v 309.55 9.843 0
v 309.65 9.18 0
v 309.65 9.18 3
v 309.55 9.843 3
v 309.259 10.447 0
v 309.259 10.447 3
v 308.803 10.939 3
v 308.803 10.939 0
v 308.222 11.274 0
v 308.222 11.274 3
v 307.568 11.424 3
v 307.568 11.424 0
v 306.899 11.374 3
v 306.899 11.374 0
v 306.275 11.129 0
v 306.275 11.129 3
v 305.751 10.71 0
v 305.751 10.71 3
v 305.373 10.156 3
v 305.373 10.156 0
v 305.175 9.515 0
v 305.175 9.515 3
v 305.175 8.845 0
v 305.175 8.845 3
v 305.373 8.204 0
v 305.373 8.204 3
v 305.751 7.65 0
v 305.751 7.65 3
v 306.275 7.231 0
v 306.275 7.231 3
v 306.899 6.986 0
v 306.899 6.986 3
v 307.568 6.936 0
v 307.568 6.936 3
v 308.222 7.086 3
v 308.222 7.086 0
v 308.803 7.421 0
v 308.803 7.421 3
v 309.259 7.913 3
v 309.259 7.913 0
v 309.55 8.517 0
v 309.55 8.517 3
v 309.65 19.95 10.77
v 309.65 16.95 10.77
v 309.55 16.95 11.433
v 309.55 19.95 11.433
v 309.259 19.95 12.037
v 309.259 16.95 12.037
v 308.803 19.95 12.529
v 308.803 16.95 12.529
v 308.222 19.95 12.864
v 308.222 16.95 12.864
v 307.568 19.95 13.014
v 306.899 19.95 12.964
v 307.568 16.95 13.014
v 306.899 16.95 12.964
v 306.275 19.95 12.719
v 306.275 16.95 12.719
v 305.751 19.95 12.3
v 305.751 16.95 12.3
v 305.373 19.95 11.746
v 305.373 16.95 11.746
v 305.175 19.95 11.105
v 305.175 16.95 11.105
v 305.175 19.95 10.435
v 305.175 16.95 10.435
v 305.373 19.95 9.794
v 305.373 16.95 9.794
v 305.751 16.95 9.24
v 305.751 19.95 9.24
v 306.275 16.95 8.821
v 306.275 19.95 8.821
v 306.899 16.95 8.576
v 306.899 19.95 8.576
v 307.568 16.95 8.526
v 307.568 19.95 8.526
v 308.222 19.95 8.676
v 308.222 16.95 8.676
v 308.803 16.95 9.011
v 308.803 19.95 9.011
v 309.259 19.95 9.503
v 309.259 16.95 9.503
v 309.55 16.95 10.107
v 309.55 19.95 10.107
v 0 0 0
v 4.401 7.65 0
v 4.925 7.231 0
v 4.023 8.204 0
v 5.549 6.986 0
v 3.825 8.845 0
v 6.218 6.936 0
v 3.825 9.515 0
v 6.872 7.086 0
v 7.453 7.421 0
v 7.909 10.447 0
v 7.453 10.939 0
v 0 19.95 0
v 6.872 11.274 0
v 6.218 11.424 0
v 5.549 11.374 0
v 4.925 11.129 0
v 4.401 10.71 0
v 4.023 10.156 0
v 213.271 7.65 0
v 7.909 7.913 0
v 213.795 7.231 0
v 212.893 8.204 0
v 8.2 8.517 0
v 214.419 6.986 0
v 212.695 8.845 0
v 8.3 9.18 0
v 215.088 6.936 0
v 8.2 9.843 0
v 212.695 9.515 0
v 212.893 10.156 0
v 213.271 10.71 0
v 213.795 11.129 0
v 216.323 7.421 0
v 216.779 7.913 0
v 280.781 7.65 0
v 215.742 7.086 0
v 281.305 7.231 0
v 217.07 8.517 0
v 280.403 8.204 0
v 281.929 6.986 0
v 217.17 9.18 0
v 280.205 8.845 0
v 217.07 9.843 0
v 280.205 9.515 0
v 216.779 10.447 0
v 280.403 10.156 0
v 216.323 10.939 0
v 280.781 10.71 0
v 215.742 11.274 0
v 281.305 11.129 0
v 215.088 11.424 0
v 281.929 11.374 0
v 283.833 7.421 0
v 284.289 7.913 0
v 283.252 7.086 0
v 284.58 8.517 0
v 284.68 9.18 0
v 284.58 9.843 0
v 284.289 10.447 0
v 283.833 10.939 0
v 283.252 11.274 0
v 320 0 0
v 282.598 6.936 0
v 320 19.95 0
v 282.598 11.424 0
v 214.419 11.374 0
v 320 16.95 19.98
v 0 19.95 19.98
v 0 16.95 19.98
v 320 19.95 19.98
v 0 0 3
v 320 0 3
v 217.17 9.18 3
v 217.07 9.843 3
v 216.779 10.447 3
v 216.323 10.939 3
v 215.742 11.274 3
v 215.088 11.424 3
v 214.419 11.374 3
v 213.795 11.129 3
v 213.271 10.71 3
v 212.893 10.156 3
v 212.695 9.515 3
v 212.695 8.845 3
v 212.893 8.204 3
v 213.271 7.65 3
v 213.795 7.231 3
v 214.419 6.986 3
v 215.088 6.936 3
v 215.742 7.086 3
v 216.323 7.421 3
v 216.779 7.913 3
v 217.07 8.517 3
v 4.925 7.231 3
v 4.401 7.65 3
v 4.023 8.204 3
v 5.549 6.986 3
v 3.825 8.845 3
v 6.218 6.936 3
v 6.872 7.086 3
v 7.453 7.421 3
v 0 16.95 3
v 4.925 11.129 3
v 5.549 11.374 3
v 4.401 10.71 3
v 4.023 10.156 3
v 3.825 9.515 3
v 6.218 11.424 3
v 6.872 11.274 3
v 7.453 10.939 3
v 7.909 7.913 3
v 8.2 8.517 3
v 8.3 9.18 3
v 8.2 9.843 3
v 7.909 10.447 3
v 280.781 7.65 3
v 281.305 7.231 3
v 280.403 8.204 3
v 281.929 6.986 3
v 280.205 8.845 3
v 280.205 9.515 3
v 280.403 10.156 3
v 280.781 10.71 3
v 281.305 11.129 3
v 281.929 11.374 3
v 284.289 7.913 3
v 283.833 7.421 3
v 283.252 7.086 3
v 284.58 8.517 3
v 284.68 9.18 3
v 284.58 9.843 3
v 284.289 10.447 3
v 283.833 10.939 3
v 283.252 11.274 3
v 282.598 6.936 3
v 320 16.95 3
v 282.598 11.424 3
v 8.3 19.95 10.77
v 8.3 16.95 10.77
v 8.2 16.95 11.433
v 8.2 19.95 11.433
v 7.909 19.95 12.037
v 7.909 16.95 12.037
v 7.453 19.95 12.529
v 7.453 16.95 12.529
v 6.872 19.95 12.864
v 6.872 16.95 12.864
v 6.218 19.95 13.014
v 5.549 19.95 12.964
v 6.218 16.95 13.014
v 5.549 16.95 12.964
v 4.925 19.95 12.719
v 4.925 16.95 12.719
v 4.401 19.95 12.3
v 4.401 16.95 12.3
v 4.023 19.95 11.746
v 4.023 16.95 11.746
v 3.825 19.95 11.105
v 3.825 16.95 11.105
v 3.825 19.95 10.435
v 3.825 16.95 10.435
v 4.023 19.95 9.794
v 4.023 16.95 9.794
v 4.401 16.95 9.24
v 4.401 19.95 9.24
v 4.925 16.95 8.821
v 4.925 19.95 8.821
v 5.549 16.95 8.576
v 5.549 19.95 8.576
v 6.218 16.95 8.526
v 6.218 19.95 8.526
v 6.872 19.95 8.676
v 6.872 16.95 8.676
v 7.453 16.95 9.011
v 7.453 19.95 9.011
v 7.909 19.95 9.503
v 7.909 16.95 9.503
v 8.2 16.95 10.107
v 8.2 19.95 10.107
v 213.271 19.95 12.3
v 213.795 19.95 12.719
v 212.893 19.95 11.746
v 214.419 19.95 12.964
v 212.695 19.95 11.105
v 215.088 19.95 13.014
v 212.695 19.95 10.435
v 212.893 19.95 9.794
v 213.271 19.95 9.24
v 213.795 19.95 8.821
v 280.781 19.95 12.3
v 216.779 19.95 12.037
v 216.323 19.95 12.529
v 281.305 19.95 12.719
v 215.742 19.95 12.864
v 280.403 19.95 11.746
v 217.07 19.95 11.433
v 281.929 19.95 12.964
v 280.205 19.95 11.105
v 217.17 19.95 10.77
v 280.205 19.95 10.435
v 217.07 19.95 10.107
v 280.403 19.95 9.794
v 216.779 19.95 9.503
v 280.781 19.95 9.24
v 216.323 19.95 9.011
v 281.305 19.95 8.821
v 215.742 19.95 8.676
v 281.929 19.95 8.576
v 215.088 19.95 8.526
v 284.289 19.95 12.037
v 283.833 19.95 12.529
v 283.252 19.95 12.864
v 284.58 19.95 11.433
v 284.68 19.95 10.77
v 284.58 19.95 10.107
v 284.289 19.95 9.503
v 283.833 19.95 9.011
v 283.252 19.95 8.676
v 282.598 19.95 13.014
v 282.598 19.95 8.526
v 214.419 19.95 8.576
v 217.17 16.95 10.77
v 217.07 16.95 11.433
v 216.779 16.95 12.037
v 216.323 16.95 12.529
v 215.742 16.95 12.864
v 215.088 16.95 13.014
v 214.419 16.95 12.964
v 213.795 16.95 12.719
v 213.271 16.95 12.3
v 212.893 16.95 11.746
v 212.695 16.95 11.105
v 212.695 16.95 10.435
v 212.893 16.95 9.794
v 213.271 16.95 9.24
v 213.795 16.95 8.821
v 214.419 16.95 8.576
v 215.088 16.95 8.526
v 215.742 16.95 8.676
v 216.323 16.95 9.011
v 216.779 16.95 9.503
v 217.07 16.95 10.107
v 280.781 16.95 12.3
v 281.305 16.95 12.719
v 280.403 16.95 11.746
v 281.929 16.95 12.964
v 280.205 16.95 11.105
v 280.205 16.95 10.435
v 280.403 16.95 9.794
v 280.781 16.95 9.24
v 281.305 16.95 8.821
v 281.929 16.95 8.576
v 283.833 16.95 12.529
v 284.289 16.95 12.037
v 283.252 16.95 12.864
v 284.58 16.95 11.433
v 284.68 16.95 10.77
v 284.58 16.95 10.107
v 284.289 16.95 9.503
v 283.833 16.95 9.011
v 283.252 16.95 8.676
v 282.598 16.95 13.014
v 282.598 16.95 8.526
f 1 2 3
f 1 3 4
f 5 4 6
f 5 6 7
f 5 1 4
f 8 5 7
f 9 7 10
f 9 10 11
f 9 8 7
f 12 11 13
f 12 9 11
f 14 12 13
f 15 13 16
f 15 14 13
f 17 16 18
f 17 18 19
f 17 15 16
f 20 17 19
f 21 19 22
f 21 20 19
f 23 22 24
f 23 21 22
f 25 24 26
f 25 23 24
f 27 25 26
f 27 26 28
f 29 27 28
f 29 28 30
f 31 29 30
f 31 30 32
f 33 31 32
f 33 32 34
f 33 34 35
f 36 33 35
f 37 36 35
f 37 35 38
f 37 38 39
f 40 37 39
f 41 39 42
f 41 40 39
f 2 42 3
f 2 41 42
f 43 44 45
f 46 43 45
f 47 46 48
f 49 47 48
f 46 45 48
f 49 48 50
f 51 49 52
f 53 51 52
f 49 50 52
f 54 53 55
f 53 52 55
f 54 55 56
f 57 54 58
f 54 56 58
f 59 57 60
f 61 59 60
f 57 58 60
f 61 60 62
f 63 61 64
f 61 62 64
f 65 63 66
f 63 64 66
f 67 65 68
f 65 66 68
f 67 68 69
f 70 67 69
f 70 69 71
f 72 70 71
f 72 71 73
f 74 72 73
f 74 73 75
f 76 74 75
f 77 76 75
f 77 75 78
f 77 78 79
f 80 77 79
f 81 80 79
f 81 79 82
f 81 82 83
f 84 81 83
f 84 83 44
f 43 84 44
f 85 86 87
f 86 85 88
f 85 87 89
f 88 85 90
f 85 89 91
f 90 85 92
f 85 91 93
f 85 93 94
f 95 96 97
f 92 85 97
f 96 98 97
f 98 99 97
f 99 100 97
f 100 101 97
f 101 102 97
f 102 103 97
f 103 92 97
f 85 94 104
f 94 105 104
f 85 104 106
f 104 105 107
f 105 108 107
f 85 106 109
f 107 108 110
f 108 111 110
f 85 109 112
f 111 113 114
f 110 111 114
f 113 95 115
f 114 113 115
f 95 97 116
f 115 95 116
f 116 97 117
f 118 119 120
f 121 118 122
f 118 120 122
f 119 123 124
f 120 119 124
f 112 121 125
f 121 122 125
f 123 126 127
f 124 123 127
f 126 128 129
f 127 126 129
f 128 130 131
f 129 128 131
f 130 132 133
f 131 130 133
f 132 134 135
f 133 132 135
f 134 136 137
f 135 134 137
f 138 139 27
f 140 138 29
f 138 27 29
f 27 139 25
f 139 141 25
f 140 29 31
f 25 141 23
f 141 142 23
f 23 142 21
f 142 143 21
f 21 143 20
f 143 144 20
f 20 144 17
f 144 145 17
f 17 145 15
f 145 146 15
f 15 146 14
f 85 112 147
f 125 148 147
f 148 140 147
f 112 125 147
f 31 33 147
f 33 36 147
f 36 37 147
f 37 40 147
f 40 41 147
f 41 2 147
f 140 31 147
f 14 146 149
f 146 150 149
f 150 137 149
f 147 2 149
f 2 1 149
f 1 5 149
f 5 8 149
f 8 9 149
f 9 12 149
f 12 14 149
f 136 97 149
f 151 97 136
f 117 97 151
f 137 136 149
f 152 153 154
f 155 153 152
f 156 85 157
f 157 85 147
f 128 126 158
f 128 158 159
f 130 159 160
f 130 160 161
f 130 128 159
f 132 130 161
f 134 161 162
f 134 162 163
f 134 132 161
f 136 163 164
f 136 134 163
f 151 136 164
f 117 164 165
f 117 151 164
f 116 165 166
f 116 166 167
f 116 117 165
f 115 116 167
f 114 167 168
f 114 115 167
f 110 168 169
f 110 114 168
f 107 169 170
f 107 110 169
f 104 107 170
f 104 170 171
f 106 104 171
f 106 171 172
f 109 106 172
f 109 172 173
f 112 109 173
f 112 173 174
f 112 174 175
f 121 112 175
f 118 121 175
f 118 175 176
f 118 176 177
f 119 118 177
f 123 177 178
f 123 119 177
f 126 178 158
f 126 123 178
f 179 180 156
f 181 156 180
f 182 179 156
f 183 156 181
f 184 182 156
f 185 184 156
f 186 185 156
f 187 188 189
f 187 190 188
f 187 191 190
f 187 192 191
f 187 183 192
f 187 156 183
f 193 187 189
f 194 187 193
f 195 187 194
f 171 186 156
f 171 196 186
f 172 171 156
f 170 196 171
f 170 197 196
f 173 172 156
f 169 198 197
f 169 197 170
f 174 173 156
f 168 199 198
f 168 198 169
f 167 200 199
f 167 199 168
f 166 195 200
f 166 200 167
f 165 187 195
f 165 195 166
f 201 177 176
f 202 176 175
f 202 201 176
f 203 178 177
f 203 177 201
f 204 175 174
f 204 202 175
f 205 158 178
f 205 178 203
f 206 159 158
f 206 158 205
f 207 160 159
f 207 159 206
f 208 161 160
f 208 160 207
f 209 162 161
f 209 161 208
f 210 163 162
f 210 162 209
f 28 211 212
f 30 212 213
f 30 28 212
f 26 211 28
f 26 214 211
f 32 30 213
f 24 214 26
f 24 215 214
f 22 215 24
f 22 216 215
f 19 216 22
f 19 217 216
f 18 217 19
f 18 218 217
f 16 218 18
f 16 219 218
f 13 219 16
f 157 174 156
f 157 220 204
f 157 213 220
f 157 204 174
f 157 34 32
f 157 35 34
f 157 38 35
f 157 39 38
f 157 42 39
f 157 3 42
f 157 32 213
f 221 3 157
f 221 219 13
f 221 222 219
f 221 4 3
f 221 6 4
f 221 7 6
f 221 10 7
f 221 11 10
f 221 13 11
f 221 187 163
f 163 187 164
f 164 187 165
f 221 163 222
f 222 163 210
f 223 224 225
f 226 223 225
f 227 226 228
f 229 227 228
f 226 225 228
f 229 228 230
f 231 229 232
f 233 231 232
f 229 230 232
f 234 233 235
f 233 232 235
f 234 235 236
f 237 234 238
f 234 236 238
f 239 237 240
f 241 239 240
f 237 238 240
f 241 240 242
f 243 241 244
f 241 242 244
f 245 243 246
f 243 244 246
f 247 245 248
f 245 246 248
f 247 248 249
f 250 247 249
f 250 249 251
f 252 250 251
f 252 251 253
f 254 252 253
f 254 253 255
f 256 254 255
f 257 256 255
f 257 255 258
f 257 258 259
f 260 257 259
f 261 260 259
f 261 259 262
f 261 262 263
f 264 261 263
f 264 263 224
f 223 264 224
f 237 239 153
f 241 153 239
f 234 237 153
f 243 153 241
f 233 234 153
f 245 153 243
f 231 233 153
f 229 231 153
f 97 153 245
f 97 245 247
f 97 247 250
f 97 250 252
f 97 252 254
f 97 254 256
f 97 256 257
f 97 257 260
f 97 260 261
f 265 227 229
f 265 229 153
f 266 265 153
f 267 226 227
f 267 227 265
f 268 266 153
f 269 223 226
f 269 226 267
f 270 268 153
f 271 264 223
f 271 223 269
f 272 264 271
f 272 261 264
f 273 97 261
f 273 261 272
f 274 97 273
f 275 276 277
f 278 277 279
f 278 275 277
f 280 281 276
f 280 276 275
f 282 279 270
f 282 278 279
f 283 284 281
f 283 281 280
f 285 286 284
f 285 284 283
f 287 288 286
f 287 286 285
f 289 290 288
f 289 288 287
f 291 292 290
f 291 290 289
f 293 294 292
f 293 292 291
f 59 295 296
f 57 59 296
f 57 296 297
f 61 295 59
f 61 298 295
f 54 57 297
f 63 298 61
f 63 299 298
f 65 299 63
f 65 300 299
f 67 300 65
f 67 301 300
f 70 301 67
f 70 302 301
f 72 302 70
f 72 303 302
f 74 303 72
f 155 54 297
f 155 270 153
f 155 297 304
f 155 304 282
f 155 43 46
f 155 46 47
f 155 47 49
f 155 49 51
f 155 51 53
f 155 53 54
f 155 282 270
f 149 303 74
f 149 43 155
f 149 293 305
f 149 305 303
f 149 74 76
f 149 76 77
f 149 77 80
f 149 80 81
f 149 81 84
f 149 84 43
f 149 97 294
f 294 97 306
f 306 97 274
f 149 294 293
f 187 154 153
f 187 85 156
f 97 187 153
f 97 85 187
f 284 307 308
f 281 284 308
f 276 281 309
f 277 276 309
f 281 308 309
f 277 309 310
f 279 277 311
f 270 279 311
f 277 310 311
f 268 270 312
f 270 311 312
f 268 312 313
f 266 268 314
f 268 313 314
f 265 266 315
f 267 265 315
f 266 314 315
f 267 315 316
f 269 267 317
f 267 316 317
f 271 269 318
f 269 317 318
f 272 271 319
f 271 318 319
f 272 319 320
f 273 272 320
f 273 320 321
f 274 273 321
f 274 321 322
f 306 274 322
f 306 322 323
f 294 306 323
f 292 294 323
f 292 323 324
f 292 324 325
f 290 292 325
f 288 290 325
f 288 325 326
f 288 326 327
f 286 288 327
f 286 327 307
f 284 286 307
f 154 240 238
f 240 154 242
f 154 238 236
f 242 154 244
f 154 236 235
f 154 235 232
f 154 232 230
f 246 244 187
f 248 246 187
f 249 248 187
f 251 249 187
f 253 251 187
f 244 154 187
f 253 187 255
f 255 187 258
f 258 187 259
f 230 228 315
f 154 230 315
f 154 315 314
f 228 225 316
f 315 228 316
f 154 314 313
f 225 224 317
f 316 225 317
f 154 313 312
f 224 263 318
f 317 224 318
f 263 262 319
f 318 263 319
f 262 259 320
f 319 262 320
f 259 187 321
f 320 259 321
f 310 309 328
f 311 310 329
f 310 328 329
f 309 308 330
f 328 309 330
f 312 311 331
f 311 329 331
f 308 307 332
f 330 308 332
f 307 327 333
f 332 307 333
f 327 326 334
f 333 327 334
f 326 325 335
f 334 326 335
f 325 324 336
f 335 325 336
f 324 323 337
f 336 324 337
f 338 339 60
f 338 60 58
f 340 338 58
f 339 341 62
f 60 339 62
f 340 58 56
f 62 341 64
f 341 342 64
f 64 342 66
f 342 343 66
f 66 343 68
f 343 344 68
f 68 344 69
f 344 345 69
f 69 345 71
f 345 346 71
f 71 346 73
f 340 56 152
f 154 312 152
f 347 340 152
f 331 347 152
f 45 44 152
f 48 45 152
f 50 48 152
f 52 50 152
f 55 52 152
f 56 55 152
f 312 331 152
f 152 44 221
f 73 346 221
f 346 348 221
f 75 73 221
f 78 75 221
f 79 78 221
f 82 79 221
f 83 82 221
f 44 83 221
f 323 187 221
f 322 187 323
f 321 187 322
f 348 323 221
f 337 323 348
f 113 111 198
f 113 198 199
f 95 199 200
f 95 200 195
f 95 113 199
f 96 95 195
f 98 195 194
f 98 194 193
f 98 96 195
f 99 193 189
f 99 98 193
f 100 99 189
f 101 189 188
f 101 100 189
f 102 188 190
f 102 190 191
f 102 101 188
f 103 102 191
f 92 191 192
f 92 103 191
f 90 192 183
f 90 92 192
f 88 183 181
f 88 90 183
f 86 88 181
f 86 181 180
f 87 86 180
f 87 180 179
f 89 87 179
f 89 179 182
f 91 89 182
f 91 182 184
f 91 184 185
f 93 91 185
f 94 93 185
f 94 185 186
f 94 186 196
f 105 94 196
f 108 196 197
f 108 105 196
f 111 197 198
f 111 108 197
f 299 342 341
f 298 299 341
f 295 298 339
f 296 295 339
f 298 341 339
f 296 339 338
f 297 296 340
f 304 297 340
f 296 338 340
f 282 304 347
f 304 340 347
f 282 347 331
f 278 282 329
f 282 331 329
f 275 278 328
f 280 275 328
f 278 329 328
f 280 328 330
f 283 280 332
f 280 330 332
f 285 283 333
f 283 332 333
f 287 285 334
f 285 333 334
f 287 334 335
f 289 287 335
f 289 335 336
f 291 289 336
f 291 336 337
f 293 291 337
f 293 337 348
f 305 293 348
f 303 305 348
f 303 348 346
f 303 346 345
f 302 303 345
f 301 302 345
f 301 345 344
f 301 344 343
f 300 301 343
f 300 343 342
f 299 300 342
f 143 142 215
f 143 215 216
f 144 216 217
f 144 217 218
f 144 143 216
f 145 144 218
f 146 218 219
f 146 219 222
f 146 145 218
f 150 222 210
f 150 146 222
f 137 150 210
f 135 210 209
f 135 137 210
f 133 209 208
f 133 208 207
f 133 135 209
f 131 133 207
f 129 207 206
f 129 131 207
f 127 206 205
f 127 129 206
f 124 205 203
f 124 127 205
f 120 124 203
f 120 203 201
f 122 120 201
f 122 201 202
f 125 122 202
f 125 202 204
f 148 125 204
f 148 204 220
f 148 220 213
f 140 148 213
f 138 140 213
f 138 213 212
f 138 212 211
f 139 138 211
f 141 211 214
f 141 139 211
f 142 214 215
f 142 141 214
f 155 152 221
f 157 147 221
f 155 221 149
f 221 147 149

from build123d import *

# Parameters (mm, degrees)
F0_W     = 320
F0_H     = 19.95
F0_R     = 2.25
F1_DEPTH = 3
F2_W     = 320
F2_H     = 3
F3_DEPTH = 16.98
F6_R     = 2.25
F7_DEPTH = 3.001


with BuildPart() as f1:
    # F0 (on Top) → F1 (new body)
    with BuildSketch(Plane.XY):
        with Locations((160, 9.975)):
            Rectangle(F0_W, F0_H)
        with Locations((6.05, 9.18)):
            Circle(F0_R, mode=Mode.SUBTRACT)
        with Locations((214.92, 9.18)):
            Circle(F0_R, mode=Mode.SUBTRACT)
        with Locations((282.43, 9.18)):
            Circle(F0_R, mode=Mode.SUBTRACT)
        with Locations((307.4, 9.18)):
            Circle(F0_R, mode=Mode.SUBTRACT)
    extrude(amount=F1_DEPTH)

    # F2 (on face) → F3 (join)
    with BuildSketch(Plane.XY.offset(3)):
        with Locations((160, 18.45)):
            Rectangle(F2_W, F2_H)
    extrude(amount=F3_DEPTH)

    # F6 (on face) → F7 (cut, through all)
    with BuildSketch(Plane.XZ.offset(-16.95)):
        with Locations((307.4, 10.77)):
            Circle(F6_R)
        with Locations((282.43, 10.77)):
            Circle(F6_R)
        with Locations((214.92, 10.77)):
            Circle(F6_R)
        with Locations((6.05, 10.77)):
            Circle(F6_R)
    extrude(amount=-F7_DEPTH, mode=Mode.SUBTRACT)


solid = f1.part
